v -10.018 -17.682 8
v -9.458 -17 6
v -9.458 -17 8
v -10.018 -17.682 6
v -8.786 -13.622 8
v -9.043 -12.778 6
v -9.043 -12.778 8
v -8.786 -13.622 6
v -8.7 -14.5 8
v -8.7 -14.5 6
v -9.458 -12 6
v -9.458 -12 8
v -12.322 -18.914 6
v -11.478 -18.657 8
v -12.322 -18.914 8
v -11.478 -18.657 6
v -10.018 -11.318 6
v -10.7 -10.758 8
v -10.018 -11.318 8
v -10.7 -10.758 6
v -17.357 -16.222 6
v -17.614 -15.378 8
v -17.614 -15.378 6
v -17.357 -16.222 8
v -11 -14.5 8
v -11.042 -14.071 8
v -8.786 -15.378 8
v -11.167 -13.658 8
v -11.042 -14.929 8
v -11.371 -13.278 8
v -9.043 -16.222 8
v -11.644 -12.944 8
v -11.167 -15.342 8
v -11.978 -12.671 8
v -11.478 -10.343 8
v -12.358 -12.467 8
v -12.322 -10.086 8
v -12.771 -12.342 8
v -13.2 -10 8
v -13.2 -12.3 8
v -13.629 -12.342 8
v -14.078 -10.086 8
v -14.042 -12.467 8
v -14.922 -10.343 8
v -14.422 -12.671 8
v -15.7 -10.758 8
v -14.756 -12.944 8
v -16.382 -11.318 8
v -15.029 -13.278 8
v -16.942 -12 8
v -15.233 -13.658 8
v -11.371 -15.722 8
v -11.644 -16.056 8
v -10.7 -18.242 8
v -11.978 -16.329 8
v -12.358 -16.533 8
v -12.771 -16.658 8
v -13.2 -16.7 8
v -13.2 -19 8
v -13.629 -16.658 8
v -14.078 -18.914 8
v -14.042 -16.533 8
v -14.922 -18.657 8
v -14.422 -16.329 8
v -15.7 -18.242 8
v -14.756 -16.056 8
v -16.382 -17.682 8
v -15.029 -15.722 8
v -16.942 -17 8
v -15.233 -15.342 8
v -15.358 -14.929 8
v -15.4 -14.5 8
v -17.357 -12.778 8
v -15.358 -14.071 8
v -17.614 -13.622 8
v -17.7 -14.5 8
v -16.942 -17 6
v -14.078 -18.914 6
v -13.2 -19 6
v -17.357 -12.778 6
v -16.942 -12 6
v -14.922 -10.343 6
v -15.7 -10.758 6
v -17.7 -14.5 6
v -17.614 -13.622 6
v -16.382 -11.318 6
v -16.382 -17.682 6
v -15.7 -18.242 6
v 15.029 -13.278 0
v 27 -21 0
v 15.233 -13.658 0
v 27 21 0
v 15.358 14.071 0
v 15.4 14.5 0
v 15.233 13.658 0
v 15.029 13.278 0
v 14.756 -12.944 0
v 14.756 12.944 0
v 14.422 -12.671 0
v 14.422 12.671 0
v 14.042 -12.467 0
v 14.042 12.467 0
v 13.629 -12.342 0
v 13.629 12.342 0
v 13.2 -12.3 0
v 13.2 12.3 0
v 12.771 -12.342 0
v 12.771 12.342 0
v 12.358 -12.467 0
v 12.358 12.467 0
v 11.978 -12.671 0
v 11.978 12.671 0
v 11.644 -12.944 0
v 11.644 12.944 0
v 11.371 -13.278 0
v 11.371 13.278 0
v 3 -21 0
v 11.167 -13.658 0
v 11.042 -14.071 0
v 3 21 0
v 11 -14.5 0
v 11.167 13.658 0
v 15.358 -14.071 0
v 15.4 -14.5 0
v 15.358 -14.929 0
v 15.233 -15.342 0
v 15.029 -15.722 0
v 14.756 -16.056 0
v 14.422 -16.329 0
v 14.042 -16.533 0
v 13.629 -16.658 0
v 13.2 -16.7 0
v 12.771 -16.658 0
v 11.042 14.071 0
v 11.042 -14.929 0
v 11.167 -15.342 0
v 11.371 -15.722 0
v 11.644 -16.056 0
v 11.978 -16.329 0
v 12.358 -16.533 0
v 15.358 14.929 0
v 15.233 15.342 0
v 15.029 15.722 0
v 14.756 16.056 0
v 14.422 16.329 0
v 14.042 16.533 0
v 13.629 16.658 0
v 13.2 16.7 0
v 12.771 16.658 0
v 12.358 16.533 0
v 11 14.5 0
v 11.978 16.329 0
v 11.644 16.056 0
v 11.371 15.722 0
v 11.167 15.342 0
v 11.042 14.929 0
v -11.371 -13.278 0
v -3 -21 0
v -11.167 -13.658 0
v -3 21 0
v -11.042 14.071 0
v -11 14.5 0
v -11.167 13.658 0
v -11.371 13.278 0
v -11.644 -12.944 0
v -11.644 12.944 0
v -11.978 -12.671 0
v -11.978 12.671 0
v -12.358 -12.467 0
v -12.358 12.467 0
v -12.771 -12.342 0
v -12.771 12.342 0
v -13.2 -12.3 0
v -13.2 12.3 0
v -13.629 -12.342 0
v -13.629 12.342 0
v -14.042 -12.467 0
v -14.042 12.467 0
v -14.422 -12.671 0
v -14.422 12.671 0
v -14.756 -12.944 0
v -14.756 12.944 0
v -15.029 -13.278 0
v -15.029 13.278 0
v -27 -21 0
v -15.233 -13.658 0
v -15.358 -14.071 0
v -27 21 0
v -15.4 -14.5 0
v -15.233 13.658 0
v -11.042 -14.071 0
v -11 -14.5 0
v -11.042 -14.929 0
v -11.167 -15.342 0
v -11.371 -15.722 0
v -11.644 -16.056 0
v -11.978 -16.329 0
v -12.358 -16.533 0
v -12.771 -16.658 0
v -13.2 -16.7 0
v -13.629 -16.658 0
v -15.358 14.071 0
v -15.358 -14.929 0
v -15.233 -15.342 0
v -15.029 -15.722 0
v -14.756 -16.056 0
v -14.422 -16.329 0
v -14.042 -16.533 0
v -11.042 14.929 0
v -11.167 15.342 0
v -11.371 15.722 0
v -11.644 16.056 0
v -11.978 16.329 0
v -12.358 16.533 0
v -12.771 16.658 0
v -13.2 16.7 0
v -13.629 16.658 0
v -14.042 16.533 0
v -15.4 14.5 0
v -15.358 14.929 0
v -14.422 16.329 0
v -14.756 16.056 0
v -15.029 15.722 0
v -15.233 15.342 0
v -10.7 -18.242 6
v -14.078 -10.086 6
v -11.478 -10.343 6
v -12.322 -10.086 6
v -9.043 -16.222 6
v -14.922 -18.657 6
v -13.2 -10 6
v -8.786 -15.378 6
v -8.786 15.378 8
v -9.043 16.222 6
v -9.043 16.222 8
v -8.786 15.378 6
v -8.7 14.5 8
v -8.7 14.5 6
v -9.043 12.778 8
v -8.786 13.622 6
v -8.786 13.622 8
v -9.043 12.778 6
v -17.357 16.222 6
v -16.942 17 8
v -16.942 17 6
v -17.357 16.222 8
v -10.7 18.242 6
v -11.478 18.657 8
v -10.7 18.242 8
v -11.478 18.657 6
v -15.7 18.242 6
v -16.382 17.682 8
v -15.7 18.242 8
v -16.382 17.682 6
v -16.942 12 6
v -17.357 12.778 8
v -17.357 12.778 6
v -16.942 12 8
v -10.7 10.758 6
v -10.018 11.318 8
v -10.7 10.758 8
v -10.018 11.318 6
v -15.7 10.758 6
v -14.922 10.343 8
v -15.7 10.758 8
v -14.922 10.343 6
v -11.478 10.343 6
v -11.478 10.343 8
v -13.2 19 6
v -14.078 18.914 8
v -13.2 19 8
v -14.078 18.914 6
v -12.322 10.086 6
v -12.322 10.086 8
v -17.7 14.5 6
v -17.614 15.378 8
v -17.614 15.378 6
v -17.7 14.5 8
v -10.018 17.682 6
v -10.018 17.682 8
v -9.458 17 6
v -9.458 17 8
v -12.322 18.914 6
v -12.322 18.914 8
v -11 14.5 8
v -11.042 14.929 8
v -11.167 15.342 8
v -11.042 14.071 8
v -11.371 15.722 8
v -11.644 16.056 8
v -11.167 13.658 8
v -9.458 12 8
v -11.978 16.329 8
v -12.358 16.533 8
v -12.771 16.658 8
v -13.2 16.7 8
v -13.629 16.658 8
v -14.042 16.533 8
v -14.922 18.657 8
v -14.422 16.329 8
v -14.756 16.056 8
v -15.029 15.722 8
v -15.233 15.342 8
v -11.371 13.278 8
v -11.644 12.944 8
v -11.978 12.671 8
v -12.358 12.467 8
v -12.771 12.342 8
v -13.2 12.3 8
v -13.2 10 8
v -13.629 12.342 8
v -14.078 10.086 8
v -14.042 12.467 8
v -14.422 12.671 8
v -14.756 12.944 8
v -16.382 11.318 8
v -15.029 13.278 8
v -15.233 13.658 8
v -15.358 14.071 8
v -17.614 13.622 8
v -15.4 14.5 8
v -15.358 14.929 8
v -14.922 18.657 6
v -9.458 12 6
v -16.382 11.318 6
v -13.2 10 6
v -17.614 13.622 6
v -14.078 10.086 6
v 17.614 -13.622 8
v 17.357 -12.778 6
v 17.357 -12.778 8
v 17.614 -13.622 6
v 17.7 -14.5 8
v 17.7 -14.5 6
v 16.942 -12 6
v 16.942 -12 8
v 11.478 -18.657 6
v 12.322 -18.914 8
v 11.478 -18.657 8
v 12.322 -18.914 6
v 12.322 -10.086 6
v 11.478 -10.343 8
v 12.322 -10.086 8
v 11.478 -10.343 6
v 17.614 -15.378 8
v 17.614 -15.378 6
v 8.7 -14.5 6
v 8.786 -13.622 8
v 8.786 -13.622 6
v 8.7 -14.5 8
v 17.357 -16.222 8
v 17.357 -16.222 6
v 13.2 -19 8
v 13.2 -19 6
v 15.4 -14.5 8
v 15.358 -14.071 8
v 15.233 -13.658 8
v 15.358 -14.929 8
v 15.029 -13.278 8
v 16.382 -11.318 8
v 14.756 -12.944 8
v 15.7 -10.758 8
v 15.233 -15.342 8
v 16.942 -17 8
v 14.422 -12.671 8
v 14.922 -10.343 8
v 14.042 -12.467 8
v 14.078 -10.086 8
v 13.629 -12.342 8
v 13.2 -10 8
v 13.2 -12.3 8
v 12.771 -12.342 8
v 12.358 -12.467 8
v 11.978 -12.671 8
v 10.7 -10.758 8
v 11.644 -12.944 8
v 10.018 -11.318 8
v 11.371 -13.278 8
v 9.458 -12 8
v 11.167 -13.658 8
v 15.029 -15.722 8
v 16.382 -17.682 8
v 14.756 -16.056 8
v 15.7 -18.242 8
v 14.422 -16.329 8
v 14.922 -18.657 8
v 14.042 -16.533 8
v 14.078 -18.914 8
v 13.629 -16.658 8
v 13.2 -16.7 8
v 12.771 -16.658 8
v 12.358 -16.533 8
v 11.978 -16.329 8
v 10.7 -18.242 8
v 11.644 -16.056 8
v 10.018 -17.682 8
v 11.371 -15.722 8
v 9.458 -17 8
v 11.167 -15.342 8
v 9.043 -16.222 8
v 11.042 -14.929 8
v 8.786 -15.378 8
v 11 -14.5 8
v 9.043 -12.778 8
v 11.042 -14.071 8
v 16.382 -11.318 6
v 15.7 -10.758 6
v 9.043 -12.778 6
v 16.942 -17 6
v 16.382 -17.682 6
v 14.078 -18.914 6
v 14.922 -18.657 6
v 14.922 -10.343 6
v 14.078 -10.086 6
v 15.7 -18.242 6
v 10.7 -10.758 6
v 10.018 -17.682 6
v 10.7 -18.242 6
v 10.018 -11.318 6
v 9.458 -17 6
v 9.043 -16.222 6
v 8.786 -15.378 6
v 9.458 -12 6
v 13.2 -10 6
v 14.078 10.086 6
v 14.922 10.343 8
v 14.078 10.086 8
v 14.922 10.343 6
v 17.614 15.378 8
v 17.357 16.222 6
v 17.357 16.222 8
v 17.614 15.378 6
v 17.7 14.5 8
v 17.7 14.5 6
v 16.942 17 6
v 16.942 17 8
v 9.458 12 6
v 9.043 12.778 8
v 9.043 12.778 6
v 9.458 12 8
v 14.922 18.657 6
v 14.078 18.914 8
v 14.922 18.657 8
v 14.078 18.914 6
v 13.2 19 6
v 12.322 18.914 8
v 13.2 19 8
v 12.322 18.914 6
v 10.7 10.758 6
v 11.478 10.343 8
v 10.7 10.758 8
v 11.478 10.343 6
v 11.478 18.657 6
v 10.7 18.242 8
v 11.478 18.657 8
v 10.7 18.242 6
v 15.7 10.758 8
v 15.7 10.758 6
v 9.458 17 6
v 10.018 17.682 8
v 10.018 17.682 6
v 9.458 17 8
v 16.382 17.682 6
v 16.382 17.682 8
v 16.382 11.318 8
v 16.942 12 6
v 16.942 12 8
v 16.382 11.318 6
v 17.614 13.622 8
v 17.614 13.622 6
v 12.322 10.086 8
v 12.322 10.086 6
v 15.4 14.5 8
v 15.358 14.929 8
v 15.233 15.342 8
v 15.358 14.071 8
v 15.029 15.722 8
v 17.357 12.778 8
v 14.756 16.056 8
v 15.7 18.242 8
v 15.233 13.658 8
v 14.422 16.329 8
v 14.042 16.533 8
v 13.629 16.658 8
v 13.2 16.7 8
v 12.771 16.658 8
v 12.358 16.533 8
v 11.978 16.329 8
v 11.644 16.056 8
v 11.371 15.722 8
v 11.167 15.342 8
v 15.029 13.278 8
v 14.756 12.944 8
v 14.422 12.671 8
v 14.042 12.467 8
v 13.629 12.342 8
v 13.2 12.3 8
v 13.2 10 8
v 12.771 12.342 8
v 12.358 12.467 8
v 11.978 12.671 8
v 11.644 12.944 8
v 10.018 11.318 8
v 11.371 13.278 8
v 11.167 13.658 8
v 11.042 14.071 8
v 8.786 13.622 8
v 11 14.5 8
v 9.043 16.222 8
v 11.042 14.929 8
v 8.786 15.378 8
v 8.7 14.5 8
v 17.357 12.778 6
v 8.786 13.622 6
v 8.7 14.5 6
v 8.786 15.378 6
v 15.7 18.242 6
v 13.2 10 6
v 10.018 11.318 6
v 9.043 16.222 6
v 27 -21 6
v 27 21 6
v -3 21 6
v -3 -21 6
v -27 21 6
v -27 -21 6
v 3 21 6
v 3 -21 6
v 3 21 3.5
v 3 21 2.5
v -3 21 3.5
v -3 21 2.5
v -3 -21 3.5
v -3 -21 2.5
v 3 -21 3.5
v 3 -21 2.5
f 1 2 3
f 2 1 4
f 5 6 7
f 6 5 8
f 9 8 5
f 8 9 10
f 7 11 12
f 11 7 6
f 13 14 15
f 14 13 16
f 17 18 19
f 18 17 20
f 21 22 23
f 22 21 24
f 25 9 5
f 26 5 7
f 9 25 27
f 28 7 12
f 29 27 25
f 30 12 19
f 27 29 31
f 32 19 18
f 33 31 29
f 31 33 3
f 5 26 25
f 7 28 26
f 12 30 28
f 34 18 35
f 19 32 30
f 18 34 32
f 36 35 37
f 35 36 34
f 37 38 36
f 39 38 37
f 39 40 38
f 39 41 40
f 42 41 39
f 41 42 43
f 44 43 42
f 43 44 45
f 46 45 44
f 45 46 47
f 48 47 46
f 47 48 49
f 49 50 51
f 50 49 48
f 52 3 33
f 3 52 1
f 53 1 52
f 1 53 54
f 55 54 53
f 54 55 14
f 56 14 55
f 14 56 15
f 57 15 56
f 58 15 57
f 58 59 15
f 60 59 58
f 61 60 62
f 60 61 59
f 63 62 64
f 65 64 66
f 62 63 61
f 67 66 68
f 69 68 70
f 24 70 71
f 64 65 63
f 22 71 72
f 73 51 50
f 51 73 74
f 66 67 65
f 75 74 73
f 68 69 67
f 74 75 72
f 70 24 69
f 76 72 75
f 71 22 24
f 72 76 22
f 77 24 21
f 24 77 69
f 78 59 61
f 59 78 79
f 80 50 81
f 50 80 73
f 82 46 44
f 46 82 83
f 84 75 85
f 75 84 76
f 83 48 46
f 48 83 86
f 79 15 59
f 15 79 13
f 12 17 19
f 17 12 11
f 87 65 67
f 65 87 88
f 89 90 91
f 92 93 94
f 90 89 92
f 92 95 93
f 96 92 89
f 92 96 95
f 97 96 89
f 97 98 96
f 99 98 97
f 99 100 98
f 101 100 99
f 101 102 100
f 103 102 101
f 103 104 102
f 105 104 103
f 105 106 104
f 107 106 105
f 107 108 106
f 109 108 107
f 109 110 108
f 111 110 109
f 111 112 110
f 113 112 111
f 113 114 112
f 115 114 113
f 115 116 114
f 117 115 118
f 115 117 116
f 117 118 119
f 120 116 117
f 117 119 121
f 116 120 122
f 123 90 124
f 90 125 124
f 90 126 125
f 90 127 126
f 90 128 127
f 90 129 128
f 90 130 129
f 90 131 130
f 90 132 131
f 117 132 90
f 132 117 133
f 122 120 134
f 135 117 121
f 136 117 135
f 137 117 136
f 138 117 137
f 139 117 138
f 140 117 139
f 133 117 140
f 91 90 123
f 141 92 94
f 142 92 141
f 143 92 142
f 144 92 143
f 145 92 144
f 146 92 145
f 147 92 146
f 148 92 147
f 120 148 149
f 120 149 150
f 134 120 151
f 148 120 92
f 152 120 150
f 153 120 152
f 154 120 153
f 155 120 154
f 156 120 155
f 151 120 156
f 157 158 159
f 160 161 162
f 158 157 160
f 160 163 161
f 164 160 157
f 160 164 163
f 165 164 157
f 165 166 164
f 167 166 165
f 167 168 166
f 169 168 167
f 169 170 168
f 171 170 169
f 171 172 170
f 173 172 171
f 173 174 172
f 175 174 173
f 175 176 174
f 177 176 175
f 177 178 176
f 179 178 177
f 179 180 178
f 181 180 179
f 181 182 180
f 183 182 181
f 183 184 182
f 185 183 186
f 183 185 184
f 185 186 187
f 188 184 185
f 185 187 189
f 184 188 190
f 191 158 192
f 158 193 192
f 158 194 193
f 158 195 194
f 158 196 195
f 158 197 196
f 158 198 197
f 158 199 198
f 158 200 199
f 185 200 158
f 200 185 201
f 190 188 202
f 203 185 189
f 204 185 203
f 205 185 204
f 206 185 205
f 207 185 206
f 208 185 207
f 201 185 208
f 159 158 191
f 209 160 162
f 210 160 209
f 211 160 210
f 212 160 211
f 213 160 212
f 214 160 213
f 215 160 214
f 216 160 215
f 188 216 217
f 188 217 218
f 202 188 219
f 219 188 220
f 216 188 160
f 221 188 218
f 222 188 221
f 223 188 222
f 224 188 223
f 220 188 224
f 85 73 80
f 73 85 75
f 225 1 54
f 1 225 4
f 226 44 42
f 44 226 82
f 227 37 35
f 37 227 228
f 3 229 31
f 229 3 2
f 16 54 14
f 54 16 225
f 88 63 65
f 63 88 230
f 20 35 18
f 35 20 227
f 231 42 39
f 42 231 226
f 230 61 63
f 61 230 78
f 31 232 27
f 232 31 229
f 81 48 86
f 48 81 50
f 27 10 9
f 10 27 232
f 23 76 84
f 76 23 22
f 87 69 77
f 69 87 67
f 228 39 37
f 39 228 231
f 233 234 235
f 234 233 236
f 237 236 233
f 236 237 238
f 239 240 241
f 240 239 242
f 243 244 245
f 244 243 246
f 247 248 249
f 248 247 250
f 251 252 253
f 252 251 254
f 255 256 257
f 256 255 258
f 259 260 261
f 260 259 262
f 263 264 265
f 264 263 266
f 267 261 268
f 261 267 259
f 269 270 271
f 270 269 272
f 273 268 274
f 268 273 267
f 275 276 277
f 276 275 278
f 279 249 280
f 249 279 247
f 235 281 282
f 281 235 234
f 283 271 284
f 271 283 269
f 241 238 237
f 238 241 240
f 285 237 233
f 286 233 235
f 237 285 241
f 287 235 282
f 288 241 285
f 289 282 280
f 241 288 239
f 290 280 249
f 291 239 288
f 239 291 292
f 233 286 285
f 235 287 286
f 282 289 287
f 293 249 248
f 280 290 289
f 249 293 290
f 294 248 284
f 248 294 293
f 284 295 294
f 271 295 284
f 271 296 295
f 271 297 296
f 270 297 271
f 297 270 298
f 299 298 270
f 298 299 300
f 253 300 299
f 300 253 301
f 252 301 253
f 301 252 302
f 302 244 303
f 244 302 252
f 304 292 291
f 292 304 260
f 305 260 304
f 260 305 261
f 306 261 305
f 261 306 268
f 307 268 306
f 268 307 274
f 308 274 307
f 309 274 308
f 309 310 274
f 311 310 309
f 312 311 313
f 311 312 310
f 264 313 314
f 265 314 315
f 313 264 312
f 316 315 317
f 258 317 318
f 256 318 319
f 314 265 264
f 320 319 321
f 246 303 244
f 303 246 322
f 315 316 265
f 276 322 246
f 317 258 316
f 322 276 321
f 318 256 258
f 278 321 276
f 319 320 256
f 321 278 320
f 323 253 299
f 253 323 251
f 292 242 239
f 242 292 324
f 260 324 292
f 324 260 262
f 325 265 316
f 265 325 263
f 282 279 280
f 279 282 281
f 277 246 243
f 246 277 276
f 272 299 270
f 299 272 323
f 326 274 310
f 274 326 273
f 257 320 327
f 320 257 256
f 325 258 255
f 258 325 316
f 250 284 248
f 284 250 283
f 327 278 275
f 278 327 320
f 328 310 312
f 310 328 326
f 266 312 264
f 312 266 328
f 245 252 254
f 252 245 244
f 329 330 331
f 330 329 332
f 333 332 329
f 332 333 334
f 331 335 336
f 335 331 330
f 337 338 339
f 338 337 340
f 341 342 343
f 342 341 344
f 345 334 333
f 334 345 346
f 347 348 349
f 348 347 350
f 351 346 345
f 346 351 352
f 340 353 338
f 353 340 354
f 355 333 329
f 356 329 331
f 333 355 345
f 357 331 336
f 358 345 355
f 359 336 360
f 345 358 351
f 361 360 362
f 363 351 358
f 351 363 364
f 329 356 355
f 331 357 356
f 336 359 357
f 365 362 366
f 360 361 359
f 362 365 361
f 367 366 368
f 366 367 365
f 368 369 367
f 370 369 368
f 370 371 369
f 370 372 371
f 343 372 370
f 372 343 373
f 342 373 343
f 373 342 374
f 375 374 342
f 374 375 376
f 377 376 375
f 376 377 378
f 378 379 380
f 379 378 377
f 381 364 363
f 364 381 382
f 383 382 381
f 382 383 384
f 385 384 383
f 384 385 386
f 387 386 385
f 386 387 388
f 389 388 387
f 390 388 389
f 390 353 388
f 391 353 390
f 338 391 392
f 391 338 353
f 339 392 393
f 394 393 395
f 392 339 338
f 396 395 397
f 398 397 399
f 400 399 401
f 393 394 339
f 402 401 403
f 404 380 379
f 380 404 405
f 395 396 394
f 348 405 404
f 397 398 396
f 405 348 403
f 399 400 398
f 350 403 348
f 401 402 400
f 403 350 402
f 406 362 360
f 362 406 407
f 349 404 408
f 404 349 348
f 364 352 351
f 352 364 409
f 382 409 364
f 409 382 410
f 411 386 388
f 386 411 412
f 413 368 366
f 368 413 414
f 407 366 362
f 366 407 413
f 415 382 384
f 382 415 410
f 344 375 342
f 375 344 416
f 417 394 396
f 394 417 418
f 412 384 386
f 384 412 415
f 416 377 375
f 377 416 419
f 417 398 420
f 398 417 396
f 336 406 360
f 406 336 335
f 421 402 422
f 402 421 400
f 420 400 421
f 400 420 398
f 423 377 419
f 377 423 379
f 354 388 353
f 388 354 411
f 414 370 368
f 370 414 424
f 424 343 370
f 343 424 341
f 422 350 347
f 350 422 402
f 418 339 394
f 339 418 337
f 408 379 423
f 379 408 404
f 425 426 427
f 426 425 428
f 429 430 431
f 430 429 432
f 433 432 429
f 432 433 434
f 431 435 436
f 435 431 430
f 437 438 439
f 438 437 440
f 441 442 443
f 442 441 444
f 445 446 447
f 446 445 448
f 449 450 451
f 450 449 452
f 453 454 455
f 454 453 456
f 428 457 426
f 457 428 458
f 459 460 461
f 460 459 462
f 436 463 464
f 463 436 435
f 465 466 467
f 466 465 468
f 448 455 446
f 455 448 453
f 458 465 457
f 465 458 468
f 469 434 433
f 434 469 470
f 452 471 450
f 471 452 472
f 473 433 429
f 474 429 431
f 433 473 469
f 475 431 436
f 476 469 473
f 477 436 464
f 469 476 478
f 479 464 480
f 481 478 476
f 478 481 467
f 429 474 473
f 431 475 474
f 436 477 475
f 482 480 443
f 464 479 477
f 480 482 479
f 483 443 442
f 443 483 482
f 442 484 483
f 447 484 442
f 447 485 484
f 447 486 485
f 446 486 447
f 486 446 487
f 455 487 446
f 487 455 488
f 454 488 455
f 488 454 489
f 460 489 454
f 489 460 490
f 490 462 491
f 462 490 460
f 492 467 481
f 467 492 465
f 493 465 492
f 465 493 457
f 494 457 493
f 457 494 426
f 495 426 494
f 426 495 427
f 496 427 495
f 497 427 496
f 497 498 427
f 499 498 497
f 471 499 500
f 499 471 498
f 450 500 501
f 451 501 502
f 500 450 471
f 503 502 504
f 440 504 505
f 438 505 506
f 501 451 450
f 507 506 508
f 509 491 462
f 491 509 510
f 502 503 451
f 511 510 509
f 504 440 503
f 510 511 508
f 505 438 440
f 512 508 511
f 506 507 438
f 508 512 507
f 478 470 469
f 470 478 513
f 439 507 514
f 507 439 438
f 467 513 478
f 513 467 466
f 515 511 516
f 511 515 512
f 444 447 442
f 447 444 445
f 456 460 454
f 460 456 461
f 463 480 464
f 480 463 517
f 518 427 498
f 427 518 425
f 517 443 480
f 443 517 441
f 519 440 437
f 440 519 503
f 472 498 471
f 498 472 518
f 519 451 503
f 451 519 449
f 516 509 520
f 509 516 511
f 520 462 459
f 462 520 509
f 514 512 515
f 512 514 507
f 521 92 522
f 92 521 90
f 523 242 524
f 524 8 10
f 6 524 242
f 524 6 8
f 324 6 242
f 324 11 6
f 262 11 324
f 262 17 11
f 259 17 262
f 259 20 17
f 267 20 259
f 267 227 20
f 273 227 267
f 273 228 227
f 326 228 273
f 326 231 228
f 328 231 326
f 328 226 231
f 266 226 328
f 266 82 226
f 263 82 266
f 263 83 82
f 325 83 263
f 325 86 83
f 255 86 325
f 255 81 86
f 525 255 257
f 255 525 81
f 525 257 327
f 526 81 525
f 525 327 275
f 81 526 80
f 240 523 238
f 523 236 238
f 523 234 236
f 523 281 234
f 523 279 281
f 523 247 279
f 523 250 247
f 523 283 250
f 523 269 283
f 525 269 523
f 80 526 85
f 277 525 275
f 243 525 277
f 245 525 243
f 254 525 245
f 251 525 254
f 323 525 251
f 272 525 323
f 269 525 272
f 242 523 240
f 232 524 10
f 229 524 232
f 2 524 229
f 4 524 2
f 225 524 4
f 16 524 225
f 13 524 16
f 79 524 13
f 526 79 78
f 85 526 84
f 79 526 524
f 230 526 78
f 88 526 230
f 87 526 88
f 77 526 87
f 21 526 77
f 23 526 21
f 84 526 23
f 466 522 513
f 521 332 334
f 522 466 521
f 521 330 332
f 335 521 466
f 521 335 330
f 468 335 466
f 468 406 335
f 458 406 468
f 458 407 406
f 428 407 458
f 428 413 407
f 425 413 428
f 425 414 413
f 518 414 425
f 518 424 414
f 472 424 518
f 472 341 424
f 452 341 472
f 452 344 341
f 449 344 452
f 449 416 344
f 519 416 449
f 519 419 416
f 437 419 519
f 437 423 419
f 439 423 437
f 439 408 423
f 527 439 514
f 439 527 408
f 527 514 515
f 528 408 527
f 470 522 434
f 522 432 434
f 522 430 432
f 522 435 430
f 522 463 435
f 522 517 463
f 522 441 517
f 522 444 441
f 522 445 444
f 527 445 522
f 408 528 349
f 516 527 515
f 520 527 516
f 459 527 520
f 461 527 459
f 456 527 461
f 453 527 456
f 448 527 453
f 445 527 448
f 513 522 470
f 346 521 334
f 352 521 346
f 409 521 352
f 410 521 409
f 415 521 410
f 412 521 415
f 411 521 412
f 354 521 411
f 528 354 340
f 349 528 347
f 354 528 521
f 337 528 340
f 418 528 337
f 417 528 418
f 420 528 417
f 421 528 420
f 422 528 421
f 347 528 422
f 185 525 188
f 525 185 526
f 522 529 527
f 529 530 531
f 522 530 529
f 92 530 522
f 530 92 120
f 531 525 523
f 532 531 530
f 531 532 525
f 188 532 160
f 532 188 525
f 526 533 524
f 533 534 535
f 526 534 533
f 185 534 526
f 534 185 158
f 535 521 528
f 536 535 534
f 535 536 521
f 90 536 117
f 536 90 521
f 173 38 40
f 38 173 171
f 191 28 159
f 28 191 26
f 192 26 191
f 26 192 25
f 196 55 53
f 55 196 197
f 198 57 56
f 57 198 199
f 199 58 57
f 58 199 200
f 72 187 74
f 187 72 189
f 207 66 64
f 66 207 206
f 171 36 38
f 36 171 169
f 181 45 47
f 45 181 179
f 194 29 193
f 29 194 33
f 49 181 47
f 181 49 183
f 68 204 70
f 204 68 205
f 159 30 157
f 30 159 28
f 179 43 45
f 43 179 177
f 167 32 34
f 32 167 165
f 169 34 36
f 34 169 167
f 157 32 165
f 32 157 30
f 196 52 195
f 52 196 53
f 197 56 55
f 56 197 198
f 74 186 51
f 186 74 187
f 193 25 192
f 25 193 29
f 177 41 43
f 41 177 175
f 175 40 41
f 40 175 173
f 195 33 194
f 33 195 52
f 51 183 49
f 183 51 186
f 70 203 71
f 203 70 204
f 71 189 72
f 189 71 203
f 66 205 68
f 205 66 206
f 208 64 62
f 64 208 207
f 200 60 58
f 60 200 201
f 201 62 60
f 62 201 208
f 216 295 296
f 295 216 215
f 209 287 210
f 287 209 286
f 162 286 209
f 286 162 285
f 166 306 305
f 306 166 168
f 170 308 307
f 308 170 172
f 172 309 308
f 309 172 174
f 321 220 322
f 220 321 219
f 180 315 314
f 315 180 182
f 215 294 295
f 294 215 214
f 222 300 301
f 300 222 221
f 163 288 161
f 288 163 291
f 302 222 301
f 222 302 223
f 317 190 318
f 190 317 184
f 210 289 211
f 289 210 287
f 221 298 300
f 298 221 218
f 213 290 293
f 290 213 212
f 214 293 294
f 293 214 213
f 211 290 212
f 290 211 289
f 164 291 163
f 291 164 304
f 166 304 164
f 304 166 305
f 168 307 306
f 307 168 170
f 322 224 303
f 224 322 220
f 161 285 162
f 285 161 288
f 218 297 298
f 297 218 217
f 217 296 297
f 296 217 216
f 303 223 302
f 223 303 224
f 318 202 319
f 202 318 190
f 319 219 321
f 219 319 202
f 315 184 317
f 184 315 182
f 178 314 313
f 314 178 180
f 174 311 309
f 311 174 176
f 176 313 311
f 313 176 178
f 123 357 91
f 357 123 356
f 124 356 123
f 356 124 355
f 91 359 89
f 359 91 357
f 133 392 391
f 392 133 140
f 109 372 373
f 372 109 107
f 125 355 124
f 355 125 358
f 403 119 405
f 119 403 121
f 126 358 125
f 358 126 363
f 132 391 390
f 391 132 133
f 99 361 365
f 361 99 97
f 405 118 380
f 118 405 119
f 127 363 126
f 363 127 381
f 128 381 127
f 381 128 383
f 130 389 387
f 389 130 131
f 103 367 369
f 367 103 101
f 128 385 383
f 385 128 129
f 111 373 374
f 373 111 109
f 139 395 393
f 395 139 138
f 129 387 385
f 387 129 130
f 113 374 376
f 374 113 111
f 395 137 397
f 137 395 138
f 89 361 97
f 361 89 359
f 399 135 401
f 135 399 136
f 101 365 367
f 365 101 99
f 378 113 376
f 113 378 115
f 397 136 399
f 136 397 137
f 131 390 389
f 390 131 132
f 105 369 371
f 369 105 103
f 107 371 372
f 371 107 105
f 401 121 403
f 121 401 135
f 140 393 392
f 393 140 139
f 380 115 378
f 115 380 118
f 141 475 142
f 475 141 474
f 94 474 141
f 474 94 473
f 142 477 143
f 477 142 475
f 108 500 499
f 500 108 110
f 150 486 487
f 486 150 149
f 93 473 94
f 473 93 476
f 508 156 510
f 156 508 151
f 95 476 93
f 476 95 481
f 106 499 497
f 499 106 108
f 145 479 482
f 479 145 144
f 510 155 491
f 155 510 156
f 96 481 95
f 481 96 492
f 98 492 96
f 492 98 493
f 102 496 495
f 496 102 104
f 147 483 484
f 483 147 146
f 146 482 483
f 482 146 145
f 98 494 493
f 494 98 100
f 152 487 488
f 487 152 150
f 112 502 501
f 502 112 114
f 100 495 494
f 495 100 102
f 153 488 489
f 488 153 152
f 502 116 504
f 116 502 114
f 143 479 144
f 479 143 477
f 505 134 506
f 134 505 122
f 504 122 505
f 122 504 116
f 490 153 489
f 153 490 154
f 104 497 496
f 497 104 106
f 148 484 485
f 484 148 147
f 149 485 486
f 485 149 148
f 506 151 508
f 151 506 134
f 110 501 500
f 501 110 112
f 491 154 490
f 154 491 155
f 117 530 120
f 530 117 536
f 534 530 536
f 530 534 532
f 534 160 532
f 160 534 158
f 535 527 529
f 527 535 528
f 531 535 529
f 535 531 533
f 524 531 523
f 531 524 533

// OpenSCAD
$fn = 32;

// ----------------------------------------------------------------------
// Living hinge: 54 x 42 mm plates, 1 mm flexible web
// ----------------------------------------------------------------------

// --- parameters (mm) ---
plate_len = 24;           // plate length outside the web
plate_w = 42;             // plate width
thick = 6;                // plate thickness
web_half = 3;             // half width of the flex band
web_t = 1;                // flexible web thickness
web_z = 2.5;              // web position inside the thickness
boss_d = 9;               // screw boss diameter
boss_h = 8;               // screw boss height
boss_x = 13.2;            // screw boss distance from the web
screw_d = 4.4;            // screw hole

difference() {
  union() {
    /* one flat strip, later thinned at the middle */
    translate([-27, -21, 0]) cube([54, 42, 6]);
    /* screw bosses, sunk 0.5 mm into the plates */
    for (sx = [-13.2, 13.2]) {
      for (sy = [-14.5, 14.5]) {
        translate([sx, sy, 0]) cylinder(h = boss_h, d = boss_d);
      }
    }
  }
  /* channel from below: leaves the web on top of it */
  translate([-3, -23.5, -2.5]) cube([6, 47, 5]);
  /* channel from above: thins the web down to web_t */
  translate([-3, -23.5, 3.5]) cube([6, 47, 5]);
  /* screw holes through the bosses */
  for (sx = [-13.2, 13.2]) {
    for (sy = [-14.5, 14.5]) {
      translate([sx, sy, -2.5]) cylinder(h = boss_h + 5, d = screw_d);
    }
  }
}
